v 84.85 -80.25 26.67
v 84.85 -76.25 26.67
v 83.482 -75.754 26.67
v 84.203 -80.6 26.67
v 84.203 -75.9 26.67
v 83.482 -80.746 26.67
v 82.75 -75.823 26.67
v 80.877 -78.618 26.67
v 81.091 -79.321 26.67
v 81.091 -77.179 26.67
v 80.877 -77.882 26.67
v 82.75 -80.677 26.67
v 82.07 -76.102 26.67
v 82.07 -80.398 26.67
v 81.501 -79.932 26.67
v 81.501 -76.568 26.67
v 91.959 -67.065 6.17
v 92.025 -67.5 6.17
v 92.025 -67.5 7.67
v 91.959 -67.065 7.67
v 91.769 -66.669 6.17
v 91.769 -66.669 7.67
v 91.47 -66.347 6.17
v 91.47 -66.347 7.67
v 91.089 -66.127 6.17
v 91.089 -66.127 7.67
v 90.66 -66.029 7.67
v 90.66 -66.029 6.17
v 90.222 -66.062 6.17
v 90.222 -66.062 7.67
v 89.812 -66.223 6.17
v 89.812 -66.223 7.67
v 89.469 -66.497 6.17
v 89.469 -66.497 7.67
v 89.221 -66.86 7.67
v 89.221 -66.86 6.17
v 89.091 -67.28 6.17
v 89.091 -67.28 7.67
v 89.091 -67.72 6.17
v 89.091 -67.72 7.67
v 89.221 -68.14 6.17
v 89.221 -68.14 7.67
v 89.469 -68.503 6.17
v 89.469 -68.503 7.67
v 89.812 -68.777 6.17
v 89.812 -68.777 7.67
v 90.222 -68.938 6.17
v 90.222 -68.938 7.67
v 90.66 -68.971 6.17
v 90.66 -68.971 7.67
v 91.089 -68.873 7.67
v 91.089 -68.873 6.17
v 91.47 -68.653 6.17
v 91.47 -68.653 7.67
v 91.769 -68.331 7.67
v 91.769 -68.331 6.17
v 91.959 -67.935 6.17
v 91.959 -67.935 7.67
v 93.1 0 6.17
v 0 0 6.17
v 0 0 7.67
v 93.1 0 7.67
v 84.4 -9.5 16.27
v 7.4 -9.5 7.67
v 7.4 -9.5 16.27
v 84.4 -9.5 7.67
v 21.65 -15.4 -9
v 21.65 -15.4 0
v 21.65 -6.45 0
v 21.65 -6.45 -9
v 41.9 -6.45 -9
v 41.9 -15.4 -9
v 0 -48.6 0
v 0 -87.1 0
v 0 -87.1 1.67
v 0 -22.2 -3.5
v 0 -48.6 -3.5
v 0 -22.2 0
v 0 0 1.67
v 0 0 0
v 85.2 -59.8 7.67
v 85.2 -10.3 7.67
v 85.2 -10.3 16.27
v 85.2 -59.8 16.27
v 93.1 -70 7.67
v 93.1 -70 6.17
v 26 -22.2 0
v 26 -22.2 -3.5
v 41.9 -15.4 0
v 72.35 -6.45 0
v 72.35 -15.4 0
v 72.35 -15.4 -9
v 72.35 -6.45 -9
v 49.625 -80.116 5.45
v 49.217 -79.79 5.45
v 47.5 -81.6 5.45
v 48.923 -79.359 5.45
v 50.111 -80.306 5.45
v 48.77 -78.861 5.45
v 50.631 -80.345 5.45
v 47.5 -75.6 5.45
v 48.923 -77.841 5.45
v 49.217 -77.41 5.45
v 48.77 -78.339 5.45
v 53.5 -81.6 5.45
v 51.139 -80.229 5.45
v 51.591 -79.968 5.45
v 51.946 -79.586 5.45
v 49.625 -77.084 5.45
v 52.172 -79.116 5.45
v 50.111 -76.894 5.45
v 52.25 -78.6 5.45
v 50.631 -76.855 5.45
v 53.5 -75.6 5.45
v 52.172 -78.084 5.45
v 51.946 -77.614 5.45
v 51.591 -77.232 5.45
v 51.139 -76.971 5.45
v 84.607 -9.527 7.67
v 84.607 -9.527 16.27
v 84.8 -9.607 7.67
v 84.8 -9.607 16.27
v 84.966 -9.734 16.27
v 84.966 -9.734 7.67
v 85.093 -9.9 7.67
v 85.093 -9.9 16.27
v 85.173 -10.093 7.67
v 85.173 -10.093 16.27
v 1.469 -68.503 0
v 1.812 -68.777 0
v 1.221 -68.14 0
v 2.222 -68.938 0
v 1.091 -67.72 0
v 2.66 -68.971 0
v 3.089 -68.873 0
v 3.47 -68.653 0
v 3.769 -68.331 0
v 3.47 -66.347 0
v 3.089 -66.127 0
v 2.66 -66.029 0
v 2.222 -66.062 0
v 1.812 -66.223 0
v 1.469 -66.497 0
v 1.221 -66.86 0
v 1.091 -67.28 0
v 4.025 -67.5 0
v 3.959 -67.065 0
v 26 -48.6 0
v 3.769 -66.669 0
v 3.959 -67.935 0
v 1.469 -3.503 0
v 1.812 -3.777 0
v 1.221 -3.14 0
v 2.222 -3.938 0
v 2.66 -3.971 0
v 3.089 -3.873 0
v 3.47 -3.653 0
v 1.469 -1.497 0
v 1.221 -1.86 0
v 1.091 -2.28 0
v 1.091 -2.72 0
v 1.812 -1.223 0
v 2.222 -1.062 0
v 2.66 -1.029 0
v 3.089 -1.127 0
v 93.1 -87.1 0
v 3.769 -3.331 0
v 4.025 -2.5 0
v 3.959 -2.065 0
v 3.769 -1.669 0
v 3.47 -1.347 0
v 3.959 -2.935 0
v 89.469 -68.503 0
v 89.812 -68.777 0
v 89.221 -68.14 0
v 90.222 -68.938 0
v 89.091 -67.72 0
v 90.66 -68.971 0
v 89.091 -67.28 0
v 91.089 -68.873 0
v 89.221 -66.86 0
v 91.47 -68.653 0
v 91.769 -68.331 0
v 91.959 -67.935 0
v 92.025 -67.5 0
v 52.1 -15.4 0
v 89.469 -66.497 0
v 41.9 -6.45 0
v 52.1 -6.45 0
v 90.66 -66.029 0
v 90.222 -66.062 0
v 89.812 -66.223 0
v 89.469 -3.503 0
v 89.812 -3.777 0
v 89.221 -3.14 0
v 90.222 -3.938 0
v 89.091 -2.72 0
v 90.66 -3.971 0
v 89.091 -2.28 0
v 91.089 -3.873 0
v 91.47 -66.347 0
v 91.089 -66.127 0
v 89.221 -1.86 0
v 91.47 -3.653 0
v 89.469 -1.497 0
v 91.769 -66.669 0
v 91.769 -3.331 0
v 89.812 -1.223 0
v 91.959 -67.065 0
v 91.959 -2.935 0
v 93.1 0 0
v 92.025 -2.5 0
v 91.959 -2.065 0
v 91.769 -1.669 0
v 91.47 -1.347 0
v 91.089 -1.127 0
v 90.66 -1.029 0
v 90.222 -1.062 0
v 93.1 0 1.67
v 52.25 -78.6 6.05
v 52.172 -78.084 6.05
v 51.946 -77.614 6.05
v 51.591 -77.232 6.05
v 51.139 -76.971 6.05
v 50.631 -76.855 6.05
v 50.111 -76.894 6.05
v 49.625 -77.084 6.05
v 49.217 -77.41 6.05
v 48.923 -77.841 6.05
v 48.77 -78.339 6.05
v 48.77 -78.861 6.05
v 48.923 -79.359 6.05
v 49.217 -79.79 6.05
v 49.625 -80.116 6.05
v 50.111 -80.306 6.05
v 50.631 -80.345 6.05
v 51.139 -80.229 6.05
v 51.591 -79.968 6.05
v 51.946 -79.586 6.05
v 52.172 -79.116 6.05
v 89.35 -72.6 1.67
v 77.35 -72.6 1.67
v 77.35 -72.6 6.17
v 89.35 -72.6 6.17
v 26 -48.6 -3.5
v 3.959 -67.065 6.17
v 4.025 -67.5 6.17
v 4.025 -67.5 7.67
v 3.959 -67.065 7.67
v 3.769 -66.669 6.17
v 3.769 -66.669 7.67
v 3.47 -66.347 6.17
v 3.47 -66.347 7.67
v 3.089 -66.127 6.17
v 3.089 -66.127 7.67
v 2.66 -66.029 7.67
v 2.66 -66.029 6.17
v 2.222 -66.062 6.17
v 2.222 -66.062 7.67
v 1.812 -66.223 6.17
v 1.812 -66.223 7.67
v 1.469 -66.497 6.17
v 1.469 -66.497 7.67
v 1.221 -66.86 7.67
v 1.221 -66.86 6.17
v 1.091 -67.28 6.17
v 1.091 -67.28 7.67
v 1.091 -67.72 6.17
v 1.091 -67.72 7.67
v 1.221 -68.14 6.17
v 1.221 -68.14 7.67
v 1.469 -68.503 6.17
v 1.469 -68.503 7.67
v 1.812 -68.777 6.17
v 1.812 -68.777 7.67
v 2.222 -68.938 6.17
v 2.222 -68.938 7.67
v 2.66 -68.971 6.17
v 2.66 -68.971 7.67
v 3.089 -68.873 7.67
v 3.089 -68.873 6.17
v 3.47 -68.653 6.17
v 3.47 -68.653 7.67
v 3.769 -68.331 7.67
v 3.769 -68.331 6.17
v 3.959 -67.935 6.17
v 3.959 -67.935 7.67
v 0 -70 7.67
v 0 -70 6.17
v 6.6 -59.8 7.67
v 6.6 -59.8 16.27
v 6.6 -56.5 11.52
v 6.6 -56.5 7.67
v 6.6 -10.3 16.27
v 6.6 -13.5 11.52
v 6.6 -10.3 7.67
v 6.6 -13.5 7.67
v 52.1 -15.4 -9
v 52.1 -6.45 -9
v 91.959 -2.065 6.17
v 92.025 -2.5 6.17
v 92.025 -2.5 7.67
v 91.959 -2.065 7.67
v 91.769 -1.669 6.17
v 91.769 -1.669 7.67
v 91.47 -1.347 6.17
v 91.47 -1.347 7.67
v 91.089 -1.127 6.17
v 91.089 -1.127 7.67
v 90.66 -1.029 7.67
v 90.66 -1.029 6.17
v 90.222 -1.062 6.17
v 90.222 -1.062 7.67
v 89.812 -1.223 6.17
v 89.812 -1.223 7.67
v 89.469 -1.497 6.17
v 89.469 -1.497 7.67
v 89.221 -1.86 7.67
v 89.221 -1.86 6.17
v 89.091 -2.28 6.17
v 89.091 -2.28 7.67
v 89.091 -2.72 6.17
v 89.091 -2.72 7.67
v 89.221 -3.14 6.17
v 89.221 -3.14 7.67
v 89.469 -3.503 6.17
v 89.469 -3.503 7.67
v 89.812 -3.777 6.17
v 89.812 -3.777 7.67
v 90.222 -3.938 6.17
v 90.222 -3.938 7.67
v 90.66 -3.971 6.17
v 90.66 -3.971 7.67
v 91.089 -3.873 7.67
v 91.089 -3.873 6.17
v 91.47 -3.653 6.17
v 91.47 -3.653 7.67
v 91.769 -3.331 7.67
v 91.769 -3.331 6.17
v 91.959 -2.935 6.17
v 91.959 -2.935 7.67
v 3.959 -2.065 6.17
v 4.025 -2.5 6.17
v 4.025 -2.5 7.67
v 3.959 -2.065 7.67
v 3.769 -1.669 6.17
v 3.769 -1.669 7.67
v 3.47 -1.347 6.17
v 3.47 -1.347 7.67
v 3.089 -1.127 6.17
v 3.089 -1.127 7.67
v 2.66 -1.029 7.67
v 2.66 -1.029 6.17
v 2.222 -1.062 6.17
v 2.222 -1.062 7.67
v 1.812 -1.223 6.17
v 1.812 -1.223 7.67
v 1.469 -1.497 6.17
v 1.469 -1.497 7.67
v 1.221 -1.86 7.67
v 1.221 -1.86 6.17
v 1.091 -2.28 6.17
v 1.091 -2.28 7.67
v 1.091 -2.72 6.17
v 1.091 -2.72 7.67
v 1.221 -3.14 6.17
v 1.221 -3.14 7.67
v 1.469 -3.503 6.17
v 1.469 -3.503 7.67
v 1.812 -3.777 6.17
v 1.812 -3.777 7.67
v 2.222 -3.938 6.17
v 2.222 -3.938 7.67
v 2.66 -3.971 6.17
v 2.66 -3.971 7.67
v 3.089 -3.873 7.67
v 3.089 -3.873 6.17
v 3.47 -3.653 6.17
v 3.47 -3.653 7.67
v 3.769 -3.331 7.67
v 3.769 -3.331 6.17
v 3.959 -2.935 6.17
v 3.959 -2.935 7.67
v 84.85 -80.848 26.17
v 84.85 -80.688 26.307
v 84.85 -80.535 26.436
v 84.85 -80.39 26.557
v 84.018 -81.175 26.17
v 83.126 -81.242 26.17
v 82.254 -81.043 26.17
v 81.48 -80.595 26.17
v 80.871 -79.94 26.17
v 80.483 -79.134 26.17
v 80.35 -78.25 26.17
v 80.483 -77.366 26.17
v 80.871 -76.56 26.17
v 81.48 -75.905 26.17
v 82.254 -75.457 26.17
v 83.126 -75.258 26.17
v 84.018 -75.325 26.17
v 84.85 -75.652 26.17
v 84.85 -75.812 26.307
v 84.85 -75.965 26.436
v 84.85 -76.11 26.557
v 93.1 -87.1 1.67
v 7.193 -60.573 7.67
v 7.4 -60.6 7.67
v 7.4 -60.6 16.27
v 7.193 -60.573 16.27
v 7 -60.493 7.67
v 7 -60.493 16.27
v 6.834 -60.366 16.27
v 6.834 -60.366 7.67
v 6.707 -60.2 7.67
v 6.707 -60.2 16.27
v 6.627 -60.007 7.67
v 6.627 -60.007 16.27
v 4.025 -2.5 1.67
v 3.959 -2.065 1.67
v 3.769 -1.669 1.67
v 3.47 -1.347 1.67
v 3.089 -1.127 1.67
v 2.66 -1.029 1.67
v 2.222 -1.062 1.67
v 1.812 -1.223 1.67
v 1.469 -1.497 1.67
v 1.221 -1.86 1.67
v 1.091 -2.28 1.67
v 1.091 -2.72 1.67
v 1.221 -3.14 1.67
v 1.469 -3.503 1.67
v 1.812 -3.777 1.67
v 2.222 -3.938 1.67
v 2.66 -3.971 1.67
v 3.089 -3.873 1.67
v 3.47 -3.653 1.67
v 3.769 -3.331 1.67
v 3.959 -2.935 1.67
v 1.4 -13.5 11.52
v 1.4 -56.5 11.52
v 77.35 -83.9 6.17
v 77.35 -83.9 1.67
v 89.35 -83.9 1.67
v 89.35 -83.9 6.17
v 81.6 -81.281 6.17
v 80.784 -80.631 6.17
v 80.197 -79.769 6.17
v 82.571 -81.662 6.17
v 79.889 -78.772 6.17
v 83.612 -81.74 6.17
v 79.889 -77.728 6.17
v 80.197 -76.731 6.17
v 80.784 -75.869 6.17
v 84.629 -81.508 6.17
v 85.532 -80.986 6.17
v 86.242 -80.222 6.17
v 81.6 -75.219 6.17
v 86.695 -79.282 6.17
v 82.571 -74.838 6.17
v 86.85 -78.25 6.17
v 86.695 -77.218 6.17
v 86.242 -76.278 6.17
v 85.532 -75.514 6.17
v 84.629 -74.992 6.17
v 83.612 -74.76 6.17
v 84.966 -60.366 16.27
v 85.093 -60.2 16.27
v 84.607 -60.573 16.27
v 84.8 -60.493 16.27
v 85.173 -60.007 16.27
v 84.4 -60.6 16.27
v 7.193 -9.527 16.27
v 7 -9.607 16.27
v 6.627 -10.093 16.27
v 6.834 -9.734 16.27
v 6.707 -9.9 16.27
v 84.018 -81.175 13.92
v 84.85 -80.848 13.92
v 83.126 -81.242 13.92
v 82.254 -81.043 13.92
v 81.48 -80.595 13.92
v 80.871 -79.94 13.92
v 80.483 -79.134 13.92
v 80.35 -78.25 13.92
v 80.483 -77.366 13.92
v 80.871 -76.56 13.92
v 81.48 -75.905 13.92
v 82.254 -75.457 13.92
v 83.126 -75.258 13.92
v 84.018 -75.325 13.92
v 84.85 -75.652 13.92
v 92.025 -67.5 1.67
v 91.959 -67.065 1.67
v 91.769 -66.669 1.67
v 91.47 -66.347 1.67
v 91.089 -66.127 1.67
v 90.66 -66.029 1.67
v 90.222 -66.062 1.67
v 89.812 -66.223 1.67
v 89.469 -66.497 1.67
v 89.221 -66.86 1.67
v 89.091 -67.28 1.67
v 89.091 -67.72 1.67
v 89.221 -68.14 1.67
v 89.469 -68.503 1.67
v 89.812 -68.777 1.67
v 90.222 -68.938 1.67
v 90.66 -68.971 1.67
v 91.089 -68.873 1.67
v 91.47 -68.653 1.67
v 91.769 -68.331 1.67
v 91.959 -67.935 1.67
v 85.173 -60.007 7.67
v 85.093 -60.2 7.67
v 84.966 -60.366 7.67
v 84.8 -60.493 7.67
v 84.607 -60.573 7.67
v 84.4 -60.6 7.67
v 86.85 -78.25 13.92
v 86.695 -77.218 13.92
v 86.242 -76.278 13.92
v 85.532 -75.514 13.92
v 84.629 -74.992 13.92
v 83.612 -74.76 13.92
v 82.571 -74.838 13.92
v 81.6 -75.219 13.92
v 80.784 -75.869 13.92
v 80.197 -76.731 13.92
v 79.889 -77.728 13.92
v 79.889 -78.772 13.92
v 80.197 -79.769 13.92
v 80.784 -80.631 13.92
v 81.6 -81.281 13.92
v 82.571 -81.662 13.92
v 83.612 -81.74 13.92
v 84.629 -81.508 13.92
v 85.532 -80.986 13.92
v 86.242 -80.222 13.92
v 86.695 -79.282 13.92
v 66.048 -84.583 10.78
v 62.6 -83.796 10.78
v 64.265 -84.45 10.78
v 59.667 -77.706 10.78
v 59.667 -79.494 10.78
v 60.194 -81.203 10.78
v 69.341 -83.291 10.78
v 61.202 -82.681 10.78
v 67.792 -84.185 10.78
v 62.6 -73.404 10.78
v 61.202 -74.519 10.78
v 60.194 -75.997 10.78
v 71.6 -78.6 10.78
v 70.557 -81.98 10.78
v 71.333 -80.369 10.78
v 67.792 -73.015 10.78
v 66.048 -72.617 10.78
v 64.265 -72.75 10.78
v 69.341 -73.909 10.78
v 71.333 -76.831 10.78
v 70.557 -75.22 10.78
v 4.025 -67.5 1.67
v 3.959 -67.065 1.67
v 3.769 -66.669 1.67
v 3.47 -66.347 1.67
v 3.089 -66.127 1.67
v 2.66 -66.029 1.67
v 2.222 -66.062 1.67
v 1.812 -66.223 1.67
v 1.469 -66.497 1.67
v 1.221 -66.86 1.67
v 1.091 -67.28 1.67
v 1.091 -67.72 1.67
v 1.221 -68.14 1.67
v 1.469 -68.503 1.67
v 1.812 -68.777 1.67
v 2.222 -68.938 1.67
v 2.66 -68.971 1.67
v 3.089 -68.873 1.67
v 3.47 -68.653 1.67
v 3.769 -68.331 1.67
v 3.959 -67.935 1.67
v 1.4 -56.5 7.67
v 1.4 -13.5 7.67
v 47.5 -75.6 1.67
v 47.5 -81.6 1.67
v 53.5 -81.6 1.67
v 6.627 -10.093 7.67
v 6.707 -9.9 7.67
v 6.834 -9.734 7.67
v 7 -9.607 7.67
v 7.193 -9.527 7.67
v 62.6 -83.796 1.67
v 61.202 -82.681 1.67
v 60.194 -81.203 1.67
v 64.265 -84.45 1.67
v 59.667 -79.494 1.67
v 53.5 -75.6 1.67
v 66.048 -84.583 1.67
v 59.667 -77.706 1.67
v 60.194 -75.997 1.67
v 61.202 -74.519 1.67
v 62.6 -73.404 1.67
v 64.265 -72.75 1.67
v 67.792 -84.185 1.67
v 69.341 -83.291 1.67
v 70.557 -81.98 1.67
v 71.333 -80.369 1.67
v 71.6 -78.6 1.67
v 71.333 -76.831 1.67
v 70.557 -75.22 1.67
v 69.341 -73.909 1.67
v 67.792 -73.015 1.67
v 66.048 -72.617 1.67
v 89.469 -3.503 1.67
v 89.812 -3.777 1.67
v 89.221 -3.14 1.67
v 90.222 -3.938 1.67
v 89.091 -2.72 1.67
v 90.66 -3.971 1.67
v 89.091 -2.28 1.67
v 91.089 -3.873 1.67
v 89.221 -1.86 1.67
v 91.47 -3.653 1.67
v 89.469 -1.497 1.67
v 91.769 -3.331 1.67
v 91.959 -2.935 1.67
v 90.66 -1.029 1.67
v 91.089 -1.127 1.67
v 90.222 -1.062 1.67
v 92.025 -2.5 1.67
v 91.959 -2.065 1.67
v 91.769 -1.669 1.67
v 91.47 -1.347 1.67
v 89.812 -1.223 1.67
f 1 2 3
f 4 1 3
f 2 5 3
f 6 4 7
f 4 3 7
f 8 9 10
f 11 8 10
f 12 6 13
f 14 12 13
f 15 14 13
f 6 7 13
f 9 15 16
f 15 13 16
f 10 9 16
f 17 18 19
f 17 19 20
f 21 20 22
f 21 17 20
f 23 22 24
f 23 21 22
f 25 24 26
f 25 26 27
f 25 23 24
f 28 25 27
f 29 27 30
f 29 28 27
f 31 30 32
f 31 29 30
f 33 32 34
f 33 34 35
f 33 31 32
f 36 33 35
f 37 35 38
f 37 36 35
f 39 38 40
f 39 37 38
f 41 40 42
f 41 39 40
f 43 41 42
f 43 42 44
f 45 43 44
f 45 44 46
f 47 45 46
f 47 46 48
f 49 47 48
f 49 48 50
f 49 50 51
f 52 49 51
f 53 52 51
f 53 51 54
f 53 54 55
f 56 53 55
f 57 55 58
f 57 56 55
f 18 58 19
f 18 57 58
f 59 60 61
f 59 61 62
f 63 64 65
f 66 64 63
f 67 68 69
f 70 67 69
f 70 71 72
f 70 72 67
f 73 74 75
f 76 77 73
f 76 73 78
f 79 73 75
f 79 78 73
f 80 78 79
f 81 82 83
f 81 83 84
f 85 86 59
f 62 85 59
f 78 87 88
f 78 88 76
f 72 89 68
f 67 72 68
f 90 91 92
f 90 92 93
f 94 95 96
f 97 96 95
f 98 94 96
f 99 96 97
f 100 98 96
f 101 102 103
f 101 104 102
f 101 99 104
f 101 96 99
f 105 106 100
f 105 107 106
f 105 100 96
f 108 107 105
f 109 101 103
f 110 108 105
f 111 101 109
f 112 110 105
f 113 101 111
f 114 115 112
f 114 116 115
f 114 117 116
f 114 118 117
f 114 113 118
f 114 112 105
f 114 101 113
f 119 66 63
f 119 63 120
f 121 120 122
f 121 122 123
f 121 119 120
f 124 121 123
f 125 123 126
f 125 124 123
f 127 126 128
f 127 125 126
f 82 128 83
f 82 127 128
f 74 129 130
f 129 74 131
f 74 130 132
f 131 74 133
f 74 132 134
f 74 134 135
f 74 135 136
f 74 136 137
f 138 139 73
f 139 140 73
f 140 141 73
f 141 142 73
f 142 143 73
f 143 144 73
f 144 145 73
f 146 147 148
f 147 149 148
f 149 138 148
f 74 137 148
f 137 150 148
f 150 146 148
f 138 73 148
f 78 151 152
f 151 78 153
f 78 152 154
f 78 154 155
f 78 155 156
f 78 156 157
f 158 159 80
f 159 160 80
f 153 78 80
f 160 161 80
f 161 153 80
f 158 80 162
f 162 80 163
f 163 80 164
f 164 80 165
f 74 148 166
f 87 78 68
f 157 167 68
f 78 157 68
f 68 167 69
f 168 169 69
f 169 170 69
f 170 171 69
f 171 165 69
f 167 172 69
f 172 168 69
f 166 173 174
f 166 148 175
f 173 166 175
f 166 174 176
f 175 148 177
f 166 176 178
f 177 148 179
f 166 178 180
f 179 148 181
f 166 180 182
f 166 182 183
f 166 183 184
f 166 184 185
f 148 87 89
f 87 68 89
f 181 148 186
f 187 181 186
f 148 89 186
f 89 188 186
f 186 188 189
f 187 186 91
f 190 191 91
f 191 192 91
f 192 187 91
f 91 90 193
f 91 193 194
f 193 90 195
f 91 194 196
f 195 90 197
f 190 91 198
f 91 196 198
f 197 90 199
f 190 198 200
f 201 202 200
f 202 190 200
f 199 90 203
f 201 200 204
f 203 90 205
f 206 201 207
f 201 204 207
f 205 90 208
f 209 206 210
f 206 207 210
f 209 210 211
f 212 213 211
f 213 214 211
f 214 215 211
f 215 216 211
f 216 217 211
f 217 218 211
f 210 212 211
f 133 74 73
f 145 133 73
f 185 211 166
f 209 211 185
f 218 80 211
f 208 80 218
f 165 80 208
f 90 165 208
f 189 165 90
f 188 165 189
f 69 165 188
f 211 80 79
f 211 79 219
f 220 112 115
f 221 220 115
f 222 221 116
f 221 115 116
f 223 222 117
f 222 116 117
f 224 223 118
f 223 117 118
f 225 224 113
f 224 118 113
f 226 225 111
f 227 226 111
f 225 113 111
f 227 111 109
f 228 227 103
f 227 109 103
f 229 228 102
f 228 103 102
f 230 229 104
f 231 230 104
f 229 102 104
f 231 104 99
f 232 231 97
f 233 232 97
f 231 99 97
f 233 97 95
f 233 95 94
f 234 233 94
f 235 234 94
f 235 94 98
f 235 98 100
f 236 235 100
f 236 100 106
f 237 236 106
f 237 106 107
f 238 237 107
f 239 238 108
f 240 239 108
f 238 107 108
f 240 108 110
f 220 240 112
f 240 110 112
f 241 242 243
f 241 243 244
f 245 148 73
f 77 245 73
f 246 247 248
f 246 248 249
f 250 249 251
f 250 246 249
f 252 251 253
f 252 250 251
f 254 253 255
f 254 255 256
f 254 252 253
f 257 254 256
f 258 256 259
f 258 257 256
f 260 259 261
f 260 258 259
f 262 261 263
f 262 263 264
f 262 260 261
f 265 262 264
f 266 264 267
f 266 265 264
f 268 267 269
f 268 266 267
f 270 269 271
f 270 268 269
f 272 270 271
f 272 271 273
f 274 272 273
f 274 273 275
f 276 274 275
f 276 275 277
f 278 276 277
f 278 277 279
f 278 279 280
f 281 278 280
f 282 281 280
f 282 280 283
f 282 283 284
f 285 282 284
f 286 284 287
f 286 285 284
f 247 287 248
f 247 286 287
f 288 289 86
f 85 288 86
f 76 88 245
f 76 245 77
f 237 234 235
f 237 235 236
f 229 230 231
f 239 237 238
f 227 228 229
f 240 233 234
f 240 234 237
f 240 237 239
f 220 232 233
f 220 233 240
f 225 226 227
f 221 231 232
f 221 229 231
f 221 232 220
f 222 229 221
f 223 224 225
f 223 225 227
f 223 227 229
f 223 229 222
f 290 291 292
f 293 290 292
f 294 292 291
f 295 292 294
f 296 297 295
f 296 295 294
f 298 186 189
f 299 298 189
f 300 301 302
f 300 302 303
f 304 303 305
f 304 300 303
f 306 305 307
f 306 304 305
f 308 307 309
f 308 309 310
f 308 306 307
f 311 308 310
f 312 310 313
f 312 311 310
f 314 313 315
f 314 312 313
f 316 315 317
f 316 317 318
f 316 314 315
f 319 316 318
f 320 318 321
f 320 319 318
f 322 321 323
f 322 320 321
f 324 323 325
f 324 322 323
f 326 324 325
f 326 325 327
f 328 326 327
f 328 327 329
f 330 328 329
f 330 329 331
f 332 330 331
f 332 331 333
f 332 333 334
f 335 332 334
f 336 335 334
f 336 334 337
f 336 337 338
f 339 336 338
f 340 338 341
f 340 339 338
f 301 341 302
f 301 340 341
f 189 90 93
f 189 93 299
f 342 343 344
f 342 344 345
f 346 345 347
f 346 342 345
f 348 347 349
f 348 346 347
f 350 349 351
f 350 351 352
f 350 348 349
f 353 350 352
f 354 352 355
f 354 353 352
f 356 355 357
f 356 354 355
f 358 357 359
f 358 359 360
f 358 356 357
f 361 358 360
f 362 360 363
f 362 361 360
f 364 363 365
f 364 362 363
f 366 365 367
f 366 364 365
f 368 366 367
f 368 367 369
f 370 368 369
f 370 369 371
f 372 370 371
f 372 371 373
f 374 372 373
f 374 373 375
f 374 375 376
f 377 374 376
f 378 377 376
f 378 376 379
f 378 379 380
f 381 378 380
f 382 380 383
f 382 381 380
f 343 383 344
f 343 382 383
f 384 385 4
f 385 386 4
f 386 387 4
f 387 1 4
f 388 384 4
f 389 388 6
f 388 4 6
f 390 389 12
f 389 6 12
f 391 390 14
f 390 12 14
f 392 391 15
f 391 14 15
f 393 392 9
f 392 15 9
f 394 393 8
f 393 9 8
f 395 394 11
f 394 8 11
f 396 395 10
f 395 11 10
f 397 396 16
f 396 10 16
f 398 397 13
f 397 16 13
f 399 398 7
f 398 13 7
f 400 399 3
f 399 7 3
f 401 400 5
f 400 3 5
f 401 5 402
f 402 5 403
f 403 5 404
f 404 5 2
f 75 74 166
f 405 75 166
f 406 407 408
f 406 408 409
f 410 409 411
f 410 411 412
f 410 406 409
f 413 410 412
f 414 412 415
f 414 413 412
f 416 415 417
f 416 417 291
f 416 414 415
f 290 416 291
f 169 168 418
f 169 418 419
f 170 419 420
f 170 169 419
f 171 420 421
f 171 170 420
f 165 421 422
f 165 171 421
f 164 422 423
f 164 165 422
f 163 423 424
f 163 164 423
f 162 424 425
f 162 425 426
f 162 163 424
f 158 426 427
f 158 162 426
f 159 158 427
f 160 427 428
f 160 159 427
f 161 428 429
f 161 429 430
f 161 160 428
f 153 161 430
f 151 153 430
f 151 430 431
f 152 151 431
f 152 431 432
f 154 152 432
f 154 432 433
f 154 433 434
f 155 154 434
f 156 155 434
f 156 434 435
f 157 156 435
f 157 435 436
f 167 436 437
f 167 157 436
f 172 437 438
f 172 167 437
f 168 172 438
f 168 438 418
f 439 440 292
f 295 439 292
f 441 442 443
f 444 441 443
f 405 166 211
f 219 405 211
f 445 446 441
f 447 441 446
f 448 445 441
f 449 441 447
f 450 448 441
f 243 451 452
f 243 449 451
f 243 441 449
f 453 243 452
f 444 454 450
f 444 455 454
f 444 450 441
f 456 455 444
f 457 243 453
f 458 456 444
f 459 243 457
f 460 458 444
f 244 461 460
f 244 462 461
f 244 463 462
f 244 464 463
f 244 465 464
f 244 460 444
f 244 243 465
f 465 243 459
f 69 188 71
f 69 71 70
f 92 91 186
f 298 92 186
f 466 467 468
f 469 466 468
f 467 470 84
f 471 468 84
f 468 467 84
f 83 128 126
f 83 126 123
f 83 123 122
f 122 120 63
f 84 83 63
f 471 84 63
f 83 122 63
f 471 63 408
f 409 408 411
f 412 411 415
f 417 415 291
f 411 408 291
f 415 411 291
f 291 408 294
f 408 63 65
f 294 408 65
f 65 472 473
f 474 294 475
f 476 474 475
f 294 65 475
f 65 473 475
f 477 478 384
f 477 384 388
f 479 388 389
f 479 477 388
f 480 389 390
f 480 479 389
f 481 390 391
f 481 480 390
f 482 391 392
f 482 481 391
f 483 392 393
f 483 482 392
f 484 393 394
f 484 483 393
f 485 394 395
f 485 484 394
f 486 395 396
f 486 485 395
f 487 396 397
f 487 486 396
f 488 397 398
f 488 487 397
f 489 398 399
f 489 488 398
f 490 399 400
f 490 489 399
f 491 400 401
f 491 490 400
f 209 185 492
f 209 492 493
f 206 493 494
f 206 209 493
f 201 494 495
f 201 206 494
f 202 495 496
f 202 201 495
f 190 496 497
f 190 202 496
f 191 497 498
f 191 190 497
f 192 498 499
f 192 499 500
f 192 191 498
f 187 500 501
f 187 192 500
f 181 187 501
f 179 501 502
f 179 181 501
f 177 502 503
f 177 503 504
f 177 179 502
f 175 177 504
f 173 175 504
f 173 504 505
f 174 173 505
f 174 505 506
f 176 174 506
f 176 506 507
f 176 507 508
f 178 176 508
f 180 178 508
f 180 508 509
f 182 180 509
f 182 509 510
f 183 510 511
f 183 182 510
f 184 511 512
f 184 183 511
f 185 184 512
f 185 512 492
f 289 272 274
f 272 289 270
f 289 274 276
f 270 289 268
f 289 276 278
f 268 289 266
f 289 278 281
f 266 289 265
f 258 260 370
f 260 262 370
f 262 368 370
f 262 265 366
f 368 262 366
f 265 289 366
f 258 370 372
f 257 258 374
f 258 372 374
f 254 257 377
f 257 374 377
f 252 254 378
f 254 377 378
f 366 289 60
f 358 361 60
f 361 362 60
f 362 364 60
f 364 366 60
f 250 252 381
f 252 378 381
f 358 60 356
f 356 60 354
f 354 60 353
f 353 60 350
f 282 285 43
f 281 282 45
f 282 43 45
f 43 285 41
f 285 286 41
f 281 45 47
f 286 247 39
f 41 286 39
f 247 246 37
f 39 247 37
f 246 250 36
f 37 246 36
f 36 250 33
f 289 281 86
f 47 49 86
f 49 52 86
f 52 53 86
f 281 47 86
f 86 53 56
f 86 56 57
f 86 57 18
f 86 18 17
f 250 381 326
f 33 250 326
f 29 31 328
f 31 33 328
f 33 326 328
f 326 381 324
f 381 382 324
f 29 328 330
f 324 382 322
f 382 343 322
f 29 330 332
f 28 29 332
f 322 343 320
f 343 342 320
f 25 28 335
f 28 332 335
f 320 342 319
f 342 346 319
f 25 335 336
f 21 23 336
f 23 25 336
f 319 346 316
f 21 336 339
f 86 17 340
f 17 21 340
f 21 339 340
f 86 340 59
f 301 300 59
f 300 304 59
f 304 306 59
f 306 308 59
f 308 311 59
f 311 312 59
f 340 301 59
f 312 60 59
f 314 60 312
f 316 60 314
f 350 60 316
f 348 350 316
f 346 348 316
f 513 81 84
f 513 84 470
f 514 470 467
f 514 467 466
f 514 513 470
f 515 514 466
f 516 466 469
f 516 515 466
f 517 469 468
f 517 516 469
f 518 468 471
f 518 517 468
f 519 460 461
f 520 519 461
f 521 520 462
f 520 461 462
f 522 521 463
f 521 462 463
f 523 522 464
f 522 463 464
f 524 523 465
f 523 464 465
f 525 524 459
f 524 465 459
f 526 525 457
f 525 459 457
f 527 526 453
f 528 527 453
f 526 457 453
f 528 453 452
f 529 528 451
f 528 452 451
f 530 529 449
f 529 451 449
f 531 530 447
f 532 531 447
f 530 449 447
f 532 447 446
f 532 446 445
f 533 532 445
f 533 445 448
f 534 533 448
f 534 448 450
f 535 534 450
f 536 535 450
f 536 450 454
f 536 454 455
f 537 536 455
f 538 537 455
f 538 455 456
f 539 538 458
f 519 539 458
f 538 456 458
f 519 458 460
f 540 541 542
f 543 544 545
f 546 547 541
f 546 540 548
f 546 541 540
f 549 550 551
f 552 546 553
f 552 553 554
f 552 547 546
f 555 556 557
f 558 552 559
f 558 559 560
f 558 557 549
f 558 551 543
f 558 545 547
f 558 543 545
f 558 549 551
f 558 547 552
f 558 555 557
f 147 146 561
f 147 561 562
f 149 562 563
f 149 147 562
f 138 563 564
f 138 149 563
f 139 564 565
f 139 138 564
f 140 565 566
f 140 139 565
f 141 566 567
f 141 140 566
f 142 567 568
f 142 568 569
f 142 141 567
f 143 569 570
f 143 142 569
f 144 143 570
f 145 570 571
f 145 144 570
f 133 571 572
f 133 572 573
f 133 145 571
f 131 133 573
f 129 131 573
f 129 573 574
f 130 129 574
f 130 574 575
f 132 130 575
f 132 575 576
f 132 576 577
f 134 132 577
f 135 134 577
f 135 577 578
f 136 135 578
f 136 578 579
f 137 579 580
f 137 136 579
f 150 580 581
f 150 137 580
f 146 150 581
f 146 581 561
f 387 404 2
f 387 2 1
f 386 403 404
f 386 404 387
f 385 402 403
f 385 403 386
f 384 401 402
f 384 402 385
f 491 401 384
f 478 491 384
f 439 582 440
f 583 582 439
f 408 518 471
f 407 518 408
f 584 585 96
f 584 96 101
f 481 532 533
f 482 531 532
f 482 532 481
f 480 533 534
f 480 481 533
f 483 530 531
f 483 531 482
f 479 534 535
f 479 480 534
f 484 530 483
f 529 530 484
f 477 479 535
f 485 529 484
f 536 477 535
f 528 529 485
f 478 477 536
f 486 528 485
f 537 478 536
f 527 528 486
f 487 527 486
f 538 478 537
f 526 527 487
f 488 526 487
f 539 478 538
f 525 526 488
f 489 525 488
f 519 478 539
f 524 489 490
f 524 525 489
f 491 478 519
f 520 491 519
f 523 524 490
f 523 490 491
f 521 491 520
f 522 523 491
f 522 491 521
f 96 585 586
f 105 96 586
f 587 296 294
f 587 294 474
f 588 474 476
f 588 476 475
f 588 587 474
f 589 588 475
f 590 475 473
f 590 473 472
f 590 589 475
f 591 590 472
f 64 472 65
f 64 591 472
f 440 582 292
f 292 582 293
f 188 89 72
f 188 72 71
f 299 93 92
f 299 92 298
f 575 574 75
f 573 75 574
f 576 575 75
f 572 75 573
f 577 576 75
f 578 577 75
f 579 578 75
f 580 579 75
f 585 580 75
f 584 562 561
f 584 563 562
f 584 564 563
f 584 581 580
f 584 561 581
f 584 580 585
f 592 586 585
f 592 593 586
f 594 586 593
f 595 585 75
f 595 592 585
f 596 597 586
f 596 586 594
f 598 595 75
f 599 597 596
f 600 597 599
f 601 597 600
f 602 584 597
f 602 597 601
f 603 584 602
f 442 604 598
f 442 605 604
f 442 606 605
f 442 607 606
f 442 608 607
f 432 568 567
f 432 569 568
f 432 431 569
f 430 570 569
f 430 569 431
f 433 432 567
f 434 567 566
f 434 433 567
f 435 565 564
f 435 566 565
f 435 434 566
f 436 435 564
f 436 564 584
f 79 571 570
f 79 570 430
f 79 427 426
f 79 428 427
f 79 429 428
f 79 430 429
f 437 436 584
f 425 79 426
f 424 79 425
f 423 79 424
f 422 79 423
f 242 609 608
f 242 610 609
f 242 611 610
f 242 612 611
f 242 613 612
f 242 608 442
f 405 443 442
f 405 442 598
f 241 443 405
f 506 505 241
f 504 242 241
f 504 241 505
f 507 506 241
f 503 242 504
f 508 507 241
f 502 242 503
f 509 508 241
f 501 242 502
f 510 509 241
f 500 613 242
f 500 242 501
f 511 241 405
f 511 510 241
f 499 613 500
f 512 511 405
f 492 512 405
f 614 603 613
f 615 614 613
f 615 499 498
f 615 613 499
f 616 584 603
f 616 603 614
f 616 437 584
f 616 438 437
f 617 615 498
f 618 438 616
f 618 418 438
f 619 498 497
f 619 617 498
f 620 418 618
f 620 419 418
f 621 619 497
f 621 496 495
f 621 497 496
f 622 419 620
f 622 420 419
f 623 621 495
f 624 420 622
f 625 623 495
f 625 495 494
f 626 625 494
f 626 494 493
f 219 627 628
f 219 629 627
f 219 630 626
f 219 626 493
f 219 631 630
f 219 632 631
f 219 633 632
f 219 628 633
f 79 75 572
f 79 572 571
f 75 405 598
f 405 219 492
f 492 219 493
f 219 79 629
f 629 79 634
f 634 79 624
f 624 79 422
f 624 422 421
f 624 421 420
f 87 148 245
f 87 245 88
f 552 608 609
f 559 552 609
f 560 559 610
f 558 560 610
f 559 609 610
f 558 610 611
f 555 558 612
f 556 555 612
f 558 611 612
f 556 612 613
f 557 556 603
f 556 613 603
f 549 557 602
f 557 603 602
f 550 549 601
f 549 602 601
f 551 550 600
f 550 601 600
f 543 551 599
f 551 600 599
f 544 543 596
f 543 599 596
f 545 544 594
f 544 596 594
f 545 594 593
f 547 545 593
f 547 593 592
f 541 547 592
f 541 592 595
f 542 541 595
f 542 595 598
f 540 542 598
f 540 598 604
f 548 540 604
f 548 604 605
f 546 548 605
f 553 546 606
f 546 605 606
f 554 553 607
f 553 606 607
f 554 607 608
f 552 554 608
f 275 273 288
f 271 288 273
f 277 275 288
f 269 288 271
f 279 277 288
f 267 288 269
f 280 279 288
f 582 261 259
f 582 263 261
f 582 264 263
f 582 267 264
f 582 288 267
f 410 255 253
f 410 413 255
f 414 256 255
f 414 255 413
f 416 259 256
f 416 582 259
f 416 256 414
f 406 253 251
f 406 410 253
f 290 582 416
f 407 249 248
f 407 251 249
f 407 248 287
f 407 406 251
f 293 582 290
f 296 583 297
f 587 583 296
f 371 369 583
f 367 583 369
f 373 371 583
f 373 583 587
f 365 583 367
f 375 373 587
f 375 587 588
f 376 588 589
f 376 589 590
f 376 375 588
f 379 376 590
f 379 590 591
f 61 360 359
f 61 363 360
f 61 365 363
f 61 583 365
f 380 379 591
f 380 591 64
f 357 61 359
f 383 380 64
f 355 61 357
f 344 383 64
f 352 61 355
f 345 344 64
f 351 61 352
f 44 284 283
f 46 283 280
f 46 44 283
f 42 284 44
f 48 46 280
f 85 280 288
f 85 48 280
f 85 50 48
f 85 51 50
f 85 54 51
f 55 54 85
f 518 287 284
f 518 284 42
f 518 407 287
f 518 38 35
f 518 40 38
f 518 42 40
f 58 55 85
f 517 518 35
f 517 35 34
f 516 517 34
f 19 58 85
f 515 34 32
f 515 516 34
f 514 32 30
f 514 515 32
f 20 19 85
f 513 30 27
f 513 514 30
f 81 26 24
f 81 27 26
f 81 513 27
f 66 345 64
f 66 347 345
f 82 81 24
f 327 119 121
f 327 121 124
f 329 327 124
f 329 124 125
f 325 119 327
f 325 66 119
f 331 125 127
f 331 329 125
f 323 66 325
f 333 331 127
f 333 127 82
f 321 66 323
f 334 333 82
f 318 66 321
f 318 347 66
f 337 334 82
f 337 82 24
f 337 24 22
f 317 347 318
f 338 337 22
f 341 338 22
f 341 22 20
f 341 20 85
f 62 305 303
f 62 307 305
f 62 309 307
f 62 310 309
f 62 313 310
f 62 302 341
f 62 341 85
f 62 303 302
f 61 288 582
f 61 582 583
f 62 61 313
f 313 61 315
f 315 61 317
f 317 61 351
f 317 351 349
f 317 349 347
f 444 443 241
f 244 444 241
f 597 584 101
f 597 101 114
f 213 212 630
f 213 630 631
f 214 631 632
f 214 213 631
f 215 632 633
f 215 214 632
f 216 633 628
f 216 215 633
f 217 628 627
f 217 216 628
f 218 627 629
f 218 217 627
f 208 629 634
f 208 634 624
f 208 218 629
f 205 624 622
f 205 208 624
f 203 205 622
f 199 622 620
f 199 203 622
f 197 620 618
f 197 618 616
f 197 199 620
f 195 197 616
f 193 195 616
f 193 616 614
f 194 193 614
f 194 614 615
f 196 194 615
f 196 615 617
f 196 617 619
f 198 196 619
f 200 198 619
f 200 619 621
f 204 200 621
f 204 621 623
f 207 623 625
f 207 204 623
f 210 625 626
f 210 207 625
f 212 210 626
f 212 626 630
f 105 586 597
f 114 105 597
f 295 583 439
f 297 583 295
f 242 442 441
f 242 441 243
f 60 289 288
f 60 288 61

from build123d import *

# Parameters (mm, degrees)
SKETCH1_W            = 93.1
SKETCH1_H            = 87.1
SKETCH1_R            = 1.475
BOSS_EXTRUDE1_DEPTH  = 1.67
BOSS_EXTRUDE2_START  = 4.5
SKETCH2_W            = 93.1
SKETCH2_H            = 70
SKETCH2_R            = 1.475
BOSS_EXTRUDE2_DEPTH  = 1.5
BOSS_EXTRUDE3_DEPTH  = 8.6
SKETCH4_W            = 5.2
SKETCH4_H            = 43
BOSS_EXTRUDE4_DEPTH  = 3.85
SKETCH5_W            = 6
SKETCH5_H            = 6
BOSS_EXTRUDE5_DEPTH  = 3.78
SKETCH6_R            = 1.75
BOSS_EXTRUDE6_DEPTH  = 0.6
SKETCH7_R            = 6
BOSS_EXTRUDE7_DEPTH  = 9.11
SKETCH8_W            = 12
SKETCH8_H            = 11.3
BOSS_EXTRUDE8_DEPTH  = 4.5
SKETCH9_R            = 3.5
BOSS_EXTRUDE10_DEPTH = 7.75
BOSS_EXTRUDE11_DEPTH = 12.75
CHAMFER1_SIZE        = 0.5
SKETCH12_W           = 20.25
SKETCH12_H           = 8.95
BOSS_EXTRUDE12_DEPTH = 9
SKETCH13_W           = 26
SKETCH13_H           = 26.4
BOSS_EXTRUDE13_DEPTH = 3.5


with BuildPart() as part:
    # Sketch1 → Boss-Extrude1 (new body)
    with BuildSketch(Plane.XY):
        with Locations((46.55, -43.55)):
            Rectangle(SKETCH1_W, SKETCH1_H)
        with Locations((2.55, -2.5)):
            Circle(SKETCH1_R, mode=Mode.SUBTRACT)
        with Locations((90.55, -2.5)):
            Circle(SKETCH1_R, mode=Mode.SUBTRACT)
        with Locations((2.55, -67.5)):
            Circle(SKETCH1_R, mode=Mode.SUBTRACT)
        with Locations((90.55, -67.5)):
            Circle(SKETCH1_R, mode=Mode.SUBTRACT)
    extrude(amount=BOSS_EXTRUDE1_DEPTH)

    # Sketch5 → Boss-Extrude5 (add)
    with BuildSketch(Plane.XY.offset(1.67)):
        with Locations((50.5, -78.6)):
            Rectangle(SKETCH5_W, SKETCH5_H)
    extrude(amount=BOSS_EXTRUDE5_DEPTH)

    # Sketch6 → Boss-Extrude6 (add)
    with BuildSketch(Plane.XY.offset(5.45)):
        with Locations((50.5, -78.6)):
            Circle(SKETCH6_R)
    extrude(amount=BOSS_EXTRUDE6_DEPTH)

    # Sketch7 → Boss-Extrude7 (add)
    with BuildSketch(Plane.XY.offset(1.67)):
        with Locations((65.6, -78.6)):
            Circle(SKETCH7_R)
    extrude(amount=BOSS_EXTRUDE7_DEPTH)

    # Sketch8 → Boss-Extrude8 (add)
    with BuildSketch(Plane.XY.offset(1.67)):
        with Locations((83.35, -78.25)):
            Rectangle(SKETCH8_W, SKETCH8_H)
    extrude(amount=BOSS_EXTRUDE8_DEPTH)

    # Sketch9 → Boss-Extrude10 (add)
    with BuildSketch(Plane.XY.offset(6.17)):
        with Locations((83.35, -78.25)):
            Circle(SKETCH9_R)
    extrude(amount=BOSS_EXTRUDE10_DEPTH)

    # Sketch11 → Boss-Extrude11 (add)
    with BuildSketch(Plane.XY.offset(13.92)):
        with BuildLine():
            Line((84.85, -75.651923789), (84.85, -80.848076211))
            ThreePointArc((84.85, -80.848076211), (80.35, -78.25), (84.85, -75.651923789))
        make_face()
    extrude(amount=BOSS_EXTRUDE11_DEPTH)

    # Chamfer1
    chamfer1_edges = [part.edges().sort_by_distance(p)[0] for p in [
        (80.35, -78.25, 26.67),
    ]]
    chamfer(chamfer1_edges, length=CHAMFER1_SIZE)

    # Sketch12 → Boss-Extrude12 (add)
    with BuildSketch(Plane(origin=(0, 0, 0), x_dir=(-1, 0, 0), z_dir=(0, 0, -1))):
        with Locations((-62.225, -10.925)):
            Rectangle(SKETCH12_W, SKETCH12_H)
        with Locations((-31.775, -10.925)):
            Rectangle(SKETCH12_W, SKETCH12_H)
    extrude(amount=BOSS_EXTRUDE12_DEPTH)

    # Sketch13 → Boss-Extrude13 (add)
    with BuildSketch(Plane(origin=(0, 0, 0), x_dir=(-1, 0, 0), z_dir=(0, 0, -1))):
        with Locations((-13, -35.4)):
            Rectangle(SKETCH13_W, SKETCH13_H)
    extrude(amount=BOSS_EXTRUDE13_DEPTH)


with BuildPart() as body_2:
    # Sketch2 → Boss-Extrude2 (new body)
    with BuildSketch(Plane.XY.offset(1.67).offset(BOSS_EXTRUDE2_START)):
        with Locations((46.55, -35)):
            Rectangle(SKETCH2_W, SKETCH2_H)
        with Locations((2.55, -2.5)):
            Circle(SKETCH2_R, mode=Mode.SUBTRACT)
        with Locations((2.55, -67.5)):
            Circle(SKETCH2_R, mode=Mode.SUBTRACT)
        with Locations((90.55, -67.5)):
            Circle(SKETCH2_R, mode=Mode.SUBTRACT)
        with Locations((90.55, -2.5)):
            Circle(SKETCH2_R, mode=Mode.SUBTRACT)
    extrude(amount=BOSS_EXTRUDE2_DEPTH)

    # Sketch3 → Boss-Extrude3 (add)
    with BuildSketch(Plane.XY.offset(7.67)):
        with BuildLine():
            Line((7.4, -9.5), (84.4, -9.5))
            ThreePointArc((84.4, -9.5), (84.965685425, -9.734314575), (85.2, -10.3))
            Line((85.2, -10.3), (85.2, -59.8))
            ThreePointArc((85.2, -59.8), (84.965685425, -60.365685425), (84.4, -60.6))
            Line((84.4, -60.6), (7.4, -60.6))
            ThreePointArc((7.4, -60.6), (6.834314575, -60.365685425), (6.6, -59.8))
            Line((6.6, -59.8), (6.6, -10.3))
            ThreePointArc((6.6, -10.3), (6.834314575, -9.734314575), (7.4, -9.5))
        make_face()
    extrude(amount=BOSS_EXTRUDE3_DEPTH)

    # Sketch4 → Boss-Extrude4 (add)
    with BuildSketch(Plane.XY.offset(7.67)):
        with Locations((4, -35)):
            Rectangle(SKETCH4_W, SKETCH4_H)
    extrude(amount=BOSS_EXTRUDE4_DEPTH)


solid = Compound([part.part, body_2.part])
